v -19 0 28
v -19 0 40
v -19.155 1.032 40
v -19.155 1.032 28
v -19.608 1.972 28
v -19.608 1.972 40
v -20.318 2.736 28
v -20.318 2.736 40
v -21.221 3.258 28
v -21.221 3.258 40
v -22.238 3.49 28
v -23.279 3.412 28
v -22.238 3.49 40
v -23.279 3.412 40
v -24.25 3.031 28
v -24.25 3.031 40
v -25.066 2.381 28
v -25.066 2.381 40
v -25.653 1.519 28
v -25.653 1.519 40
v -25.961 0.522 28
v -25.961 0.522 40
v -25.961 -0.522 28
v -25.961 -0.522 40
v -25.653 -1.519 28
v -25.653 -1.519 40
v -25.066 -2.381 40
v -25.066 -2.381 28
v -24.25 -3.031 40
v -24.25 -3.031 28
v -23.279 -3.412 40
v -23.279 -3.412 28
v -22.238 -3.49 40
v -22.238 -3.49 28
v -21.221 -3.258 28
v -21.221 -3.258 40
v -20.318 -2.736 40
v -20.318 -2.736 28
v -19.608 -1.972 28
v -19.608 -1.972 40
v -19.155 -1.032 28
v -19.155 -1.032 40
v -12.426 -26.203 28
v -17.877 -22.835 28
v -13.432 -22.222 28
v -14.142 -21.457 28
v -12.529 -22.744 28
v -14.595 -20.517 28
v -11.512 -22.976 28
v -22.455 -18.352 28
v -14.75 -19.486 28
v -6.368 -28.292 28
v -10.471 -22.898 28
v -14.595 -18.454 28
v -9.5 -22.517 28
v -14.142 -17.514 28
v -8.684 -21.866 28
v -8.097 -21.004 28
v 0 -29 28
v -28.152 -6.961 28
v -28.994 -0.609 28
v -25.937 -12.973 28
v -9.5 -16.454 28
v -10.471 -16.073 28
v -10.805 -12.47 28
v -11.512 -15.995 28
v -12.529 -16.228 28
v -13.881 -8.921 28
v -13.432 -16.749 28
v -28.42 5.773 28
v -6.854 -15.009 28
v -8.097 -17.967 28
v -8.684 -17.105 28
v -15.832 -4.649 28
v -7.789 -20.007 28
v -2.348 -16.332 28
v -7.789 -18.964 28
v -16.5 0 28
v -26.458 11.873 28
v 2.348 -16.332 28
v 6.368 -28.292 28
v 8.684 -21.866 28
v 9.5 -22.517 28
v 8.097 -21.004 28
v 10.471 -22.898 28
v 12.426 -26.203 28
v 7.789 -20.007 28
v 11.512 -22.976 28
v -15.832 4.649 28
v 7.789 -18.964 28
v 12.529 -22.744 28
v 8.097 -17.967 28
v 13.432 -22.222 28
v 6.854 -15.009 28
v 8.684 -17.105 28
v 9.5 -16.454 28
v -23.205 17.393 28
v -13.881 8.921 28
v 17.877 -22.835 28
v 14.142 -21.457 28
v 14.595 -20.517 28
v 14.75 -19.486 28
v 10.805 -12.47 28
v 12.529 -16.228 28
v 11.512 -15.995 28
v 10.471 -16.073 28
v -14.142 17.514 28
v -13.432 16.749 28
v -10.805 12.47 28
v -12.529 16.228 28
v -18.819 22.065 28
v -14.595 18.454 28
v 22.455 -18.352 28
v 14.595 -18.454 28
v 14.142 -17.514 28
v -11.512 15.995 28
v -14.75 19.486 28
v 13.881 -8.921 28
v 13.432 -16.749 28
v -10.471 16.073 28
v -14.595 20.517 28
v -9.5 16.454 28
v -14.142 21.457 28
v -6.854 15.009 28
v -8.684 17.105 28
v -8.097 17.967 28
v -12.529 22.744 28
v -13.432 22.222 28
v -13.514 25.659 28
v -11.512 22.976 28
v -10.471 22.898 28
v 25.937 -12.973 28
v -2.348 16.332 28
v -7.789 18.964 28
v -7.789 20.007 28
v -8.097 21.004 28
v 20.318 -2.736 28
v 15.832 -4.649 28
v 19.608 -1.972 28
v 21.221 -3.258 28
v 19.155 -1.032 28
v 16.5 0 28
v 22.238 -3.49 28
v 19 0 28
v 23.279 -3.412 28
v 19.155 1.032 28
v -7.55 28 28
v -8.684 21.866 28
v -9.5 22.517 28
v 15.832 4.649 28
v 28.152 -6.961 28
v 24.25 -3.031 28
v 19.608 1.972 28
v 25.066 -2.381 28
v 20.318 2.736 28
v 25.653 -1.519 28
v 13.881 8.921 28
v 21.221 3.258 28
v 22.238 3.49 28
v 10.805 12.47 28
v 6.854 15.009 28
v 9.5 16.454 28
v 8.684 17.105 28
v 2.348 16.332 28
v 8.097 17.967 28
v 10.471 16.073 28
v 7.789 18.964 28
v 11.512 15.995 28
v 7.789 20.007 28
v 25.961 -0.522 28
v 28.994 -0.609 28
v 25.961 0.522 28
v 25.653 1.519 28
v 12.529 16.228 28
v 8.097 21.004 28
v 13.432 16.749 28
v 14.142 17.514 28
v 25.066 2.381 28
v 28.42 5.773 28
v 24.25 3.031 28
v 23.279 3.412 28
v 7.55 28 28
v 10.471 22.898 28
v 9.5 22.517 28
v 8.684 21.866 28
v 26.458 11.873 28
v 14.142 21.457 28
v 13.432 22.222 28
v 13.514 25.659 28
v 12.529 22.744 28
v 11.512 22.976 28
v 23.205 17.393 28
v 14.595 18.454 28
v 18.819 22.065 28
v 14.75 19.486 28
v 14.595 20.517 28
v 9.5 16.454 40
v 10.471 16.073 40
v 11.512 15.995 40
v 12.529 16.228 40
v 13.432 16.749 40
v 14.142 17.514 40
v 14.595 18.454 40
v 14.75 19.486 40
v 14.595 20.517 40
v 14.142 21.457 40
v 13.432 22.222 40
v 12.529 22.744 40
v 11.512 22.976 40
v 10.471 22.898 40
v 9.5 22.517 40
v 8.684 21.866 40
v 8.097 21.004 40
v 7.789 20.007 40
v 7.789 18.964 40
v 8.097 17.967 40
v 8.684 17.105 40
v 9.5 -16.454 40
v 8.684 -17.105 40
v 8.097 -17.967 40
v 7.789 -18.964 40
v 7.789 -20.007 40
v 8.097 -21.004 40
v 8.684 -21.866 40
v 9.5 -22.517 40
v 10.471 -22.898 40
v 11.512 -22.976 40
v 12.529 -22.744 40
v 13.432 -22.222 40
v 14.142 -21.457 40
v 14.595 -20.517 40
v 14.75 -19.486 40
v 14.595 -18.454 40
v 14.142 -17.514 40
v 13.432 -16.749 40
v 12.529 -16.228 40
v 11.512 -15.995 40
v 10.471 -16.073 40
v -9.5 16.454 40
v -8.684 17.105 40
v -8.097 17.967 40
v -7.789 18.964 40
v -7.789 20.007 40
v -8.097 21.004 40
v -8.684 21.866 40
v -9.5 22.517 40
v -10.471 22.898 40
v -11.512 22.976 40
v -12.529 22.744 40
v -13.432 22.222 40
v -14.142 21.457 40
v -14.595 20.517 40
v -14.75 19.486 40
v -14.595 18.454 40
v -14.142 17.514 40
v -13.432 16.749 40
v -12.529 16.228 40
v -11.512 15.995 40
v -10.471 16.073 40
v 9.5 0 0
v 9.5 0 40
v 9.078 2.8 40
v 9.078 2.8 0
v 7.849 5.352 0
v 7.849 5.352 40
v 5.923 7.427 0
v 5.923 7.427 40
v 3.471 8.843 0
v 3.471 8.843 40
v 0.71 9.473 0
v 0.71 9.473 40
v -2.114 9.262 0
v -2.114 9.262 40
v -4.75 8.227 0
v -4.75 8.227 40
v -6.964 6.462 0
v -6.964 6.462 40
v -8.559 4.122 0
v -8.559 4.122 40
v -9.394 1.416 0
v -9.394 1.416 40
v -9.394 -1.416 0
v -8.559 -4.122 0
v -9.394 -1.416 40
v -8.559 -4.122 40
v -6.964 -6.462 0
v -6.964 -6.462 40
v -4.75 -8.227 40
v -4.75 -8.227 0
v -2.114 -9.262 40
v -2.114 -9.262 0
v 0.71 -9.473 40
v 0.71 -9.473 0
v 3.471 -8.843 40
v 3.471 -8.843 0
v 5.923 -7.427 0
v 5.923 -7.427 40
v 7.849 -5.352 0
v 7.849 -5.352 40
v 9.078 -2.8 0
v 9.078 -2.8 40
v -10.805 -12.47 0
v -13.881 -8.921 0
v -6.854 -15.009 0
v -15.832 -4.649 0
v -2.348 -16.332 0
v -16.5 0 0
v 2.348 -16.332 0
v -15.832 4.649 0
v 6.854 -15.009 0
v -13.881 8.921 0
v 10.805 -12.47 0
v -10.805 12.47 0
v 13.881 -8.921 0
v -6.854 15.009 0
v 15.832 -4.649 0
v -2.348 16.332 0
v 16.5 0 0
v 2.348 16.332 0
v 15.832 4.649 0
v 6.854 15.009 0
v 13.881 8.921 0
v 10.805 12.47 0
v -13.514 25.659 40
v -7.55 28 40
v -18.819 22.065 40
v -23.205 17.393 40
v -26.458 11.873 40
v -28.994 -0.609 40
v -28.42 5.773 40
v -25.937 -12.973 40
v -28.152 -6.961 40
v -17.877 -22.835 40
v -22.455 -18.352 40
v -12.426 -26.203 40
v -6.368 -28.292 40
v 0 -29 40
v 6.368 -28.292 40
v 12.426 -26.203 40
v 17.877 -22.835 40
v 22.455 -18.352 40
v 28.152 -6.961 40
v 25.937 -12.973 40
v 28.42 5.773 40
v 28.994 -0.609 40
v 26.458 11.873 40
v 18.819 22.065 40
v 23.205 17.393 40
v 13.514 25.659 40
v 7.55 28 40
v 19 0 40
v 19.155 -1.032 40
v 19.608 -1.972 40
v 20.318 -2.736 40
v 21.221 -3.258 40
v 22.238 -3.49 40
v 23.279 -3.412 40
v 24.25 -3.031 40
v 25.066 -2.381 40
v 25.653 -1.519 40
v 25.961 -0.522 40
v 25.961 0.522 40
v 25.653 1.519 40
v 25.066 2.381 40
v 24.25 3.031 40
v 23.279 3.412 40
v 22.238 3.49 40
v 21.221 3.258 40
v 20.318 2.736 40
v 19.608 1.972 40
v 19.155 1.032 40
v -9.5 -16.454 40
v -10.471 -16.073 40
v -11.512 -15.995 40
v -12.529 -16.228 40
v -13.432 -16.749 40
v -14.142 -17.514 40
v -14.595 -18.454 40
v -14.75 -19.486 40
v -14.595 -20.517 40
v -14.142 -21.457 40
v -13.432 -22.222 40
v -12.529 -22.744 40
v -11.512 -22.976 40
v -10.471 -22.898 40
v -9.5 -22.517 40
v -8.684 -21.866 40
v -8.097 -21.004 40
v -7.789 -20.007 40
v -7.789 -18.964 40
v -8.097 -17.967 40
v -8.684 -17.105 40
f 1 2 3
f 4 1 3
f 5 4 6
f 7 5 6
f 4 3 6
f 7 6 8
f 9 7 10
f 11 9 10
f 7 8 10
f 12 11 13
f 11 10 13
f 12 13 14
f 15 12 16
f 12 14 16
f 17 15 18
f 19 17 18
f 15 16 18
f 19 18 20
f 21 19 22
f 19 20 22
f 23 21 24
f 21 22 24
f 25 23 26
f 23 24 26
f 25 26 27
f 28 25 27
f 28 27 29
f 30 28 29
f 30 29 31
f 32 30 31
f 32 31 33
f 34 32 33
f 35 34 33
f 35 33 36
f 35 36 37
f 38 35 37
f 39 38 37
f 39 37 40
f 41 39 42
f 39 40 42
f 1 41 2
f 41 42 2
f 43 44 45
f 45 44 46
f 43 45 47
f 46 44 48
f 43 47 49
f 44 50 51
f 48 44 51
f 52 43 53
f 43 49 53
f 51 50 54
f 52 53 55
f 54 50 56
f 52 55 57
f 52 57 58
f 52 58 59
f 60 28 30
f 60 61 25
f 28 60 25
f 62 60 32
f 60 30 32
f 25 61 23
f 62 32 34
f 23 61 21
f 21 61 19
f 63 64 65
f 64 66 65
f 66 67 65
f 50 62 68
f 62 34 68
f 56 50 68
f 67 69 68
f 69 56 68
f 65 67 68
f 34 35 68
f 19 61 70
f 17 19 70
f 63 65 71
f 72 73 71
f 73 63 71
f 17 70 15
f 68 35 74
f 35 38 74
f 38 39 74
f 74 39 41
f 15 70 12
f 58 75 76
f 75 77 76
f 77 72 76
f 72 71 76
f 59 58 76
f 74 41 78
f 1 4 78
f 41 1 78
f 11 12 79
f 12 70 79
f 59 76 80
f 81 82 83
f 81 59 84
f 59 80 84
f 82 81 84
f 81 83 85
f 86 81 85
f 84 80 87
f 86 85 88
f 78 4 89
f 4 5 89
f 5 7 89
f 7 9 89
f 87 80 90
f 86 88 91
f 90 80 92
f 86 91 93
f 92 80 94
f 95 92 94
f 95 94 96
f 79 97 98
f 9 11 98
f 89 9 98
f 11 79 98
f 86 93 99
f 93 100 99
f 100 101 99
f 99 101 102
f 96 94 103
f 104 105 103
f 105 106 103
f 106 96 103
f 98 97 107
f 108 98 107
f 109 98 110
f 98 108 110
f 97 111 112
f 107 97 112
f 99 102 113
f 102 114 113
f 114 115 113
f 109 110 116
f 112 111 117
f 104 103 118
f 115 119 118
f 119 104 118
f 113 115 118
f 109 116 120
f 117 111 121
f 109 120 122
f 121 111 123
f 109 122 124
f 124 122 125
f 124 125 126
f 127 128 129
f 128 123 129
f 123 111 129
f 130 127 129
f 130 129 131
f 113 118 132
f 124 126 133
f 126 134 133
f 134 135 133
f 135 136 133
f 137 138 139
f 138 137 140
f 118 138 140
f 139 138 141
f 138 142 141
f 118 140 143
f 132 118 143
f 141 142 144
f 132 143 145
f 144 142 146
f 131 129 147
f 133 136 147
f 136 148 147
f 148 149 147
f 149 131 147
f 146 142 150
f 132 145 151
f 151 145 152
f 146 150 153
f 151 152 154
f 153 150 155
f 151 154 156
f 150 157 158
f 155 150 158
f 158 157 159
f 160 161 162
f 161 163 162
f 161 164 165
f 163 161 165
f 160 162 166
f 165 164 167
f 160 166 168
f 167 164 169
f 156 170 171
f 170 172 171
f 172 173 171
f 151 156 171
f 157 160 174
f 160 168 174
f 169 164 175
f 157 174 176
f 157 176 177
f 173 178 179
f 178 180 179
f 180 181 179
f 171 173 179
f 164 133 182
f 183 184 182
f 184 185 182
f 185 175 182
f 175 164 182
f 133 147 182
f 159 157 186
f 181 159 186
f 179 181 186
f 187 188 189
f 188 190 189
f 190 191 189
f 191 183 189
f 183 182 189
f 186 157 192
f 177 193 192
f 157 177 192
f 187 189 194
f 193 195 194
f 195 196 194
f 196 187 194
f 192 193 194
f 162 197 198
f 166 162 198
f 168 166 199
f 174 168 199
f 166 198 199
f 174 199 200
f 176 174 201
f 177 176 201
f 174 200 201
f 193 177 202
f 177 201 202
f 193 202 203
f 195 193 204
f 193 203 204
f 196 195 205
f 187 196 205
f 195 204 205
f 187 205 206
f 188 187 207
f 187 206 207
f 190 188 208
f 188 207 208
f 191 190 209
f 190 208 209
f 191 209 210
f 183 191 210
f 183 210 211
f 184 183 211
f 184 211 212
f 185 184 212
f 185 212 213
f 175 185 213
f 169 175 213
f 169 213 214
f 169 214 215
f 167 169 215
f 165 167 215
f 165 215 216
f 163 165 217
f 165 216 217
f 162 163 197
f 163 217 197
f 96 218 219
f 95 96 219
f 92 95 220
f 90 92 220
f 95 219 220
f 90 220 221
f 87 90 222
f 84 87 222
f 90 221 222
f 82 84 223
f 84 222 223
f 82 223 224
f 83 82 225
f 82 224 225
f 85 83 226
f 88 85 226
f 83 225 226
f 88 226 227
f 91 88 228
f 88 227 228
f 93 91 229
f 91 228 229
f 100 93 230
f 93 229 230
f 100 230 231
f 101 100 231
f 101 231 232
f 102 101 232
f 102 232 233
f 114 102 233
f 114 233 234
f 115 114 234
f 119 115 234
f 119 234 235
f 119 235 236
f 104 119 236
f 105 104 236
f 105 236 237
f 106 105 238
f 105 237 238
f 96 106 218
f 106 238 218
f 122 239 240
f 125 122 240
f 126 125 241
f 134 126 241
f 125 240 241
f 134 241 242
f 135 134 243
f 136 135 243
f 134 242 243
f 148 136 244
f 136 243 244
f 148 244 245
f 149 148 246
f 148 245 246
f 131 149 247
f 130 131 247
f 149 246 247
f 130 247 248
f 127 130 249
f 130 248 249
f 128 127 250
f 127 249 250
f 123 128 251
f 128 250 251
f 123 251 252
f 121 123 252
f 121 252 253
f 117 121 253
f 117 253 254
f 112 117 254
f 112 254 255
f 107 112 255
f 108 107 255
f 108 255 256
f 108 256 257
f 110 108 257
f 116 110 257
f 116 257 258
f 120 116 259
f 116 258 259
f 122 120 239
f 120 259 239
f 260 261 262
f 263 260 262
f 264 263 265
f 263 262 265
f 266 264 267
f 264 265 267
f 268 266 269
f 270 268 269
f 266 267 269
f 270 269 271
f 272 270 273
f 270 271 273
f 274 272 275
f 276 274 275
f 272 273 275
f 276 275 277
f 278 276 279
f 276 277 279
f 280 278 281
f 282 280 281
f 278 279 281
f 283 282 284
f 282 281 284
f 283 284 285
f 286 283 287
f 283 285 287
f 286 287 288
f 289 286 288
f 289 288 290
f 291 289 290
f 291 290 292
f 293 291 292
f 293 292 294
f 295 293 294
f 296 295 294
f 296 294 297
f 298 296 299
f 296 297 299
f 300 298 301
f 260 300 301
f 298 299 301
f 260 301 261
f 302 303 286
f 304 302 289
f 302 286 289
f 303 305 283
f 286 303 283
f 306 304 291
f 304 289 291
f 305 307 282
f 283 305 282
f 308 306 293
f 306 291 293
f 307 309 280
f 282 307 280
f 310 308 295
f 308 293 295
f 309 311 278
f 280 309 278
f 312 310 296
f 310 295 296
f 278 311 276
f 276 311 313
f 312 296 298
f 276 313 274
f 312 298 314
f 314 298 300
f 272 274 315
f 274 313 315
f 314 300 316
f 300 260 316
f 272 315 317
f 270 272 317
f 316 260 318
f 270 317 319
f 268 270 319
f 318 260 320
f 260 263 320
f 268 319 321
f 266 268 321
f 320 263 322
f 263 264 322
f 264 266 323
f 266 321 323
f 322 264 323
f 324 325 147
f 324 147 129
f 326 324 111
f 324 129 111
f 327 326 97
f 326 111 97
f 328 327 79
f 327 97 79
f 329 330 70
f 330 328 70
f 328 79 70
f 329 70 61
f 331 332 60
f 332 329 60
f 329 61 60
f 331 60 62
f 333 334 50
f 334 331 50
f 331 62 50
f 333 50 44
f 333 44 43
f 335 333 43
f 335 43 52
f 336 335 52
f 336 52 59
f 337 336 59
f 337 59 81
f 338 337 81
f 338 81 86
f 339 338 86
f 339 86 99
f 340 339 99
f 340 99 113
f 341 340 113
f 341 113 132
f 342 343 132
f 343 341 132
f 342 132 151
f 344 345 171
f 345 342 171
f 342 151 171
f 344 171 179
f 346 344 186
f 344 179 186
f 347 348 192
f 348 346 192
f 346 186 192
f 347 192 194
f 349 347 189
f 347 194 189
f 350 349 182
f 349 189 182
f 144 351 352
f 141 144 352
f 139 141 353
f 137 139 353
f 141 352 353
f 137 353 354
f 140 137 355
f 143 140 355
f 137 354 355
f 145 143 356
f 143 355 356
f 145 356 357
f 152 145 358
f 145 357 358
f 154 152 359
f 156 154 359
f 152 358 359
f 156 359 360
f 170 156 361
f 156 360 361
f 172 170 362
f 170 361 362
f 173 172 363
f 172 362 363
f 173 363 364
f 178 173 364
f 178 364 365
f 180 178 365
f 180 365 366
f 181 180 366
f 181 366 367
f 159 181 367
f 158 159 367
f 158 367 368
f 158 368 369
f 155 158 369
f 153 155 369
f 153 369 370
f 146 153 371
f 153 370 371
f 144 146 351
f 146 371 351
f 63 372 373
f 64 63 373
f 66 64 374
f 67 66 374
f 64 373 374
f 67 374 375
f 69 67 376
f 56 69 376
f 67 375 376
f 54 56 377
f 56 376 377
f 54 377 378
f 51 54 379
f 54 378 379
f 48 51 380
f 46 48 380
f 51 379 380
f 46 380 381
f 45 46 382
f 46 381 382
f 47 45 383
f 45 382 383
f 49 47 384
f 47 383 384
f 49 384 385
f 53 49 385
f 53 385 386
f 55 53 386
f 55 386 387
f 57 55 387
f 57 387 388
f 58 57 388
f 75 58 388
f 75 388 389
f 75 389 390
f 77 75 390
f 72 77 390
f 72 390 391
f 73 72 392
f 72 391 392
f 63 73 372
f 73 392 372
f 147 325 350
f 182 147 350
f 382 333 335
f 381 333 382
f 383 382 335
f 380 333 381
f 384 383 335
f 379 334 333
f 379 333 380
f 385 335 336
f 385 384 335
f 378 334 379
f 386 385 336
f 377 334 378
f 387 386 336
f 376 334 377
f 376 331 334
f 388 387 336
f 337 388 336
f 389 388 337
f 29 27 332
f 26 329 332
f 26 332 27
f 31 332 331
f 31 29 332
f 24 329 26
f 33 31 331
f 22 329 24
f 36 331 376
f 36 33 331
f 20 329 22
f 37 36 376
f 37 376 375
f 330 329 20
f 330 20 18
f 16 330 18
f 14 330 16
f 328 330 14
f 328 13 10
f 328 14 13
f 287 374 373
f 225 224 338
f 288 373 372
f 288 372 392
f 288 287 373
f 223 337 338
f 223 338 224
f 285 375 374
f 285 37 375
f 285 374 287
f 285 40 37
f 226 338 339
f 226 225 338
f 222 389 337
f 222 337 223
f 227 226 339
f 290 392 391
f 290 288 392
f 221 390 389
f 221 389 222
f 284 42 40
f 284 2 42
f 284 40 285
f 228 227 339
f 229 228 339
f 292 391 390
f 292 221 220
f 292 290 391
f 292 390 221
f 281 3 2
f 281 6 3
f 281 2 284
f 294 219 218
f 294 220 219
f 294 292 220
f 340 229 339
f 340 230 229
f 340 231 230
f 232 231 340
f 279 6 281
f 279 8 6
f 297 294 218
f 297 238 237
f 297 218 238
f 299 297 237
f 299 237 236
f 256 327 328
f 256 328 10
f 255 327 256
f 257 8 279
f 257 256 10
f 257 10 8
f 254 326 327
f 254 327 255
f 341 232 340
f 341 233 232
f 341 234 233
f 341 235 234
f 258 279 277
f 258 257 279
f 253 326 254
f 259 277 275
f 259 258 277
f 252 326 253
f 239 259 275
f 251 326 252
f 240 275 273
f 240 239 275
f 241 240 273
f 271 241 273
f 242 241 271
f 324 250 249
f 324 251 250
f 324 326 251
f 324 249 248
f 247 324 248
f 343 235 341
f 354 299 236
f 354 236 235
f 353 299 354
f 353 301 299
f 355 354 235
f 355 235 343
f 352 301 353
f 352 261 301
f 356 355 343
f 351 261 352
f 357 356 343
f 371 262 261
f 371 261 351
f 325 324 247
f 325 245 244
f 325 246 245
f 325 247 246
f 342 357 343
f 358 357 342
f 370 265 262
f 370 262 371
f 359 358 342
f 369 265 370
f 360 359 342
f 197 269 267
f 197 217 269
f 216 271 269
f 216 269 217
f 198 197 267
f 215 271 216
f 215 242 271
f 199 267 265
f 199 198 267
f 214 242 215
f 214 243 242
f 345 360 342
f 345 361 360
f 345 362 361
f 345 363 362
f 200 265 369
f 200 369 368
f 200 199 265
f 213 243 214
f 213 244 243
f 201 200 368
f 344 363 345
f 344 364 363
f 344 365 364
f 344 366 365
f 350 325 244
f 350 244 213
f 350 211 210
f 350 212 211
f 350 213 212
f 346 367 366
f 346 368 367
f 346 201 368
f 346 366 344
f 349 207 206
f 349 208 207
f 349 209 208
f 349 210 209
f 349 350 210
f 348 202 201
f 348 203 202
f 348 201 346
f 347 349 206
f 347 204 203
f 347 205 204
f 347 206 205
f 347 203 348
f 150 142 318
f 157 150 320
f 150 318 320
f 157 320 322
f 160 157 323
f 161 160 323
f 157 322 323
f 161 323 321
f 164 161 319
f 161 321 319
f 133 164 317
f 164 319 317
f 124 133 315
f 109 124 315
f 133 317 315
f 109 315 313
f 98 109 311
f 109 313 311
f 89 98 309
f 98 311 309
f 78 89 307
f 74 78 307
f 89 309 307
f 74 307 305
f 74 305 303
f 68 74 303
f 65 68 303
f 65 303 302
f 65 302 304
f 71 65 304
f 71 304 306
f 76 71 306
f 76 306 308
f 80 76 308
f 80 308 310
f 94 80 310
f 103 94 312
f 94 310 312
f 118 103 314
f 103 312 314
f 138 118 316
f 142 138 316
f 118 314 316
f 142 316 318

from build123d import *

# Parameters (mm, degrees)
SZKIC1_R                    = 16.5
DODANIE_WYCI_GNI_CIE1_DEPTH = 28
SZKIC2_R                    = 29
DODANIE_WYCI_GNI_CIE2_DEPTH = 12
SZKIC3_R                    = 9.5
WYTNIJ_WYCI_GNI_CIE1_DEPTH  = 40
SZKIC4_W                    = 33.487046283
SZKIC4_H                    = 1
WYTNIJ_WYCI_GNI_CIE2_DEPTH  = 12
SZKIC5_R                    = 3.5
WYTNIJ_WYCI_GNI_CIE3_DEPTH  = 12
SZYK_KO_OWY1_COUNT          = 6


with BuildPart() as part:
    # Szkic1 → Dodanie-wyciągnięcie1 (new body)
    with BuildSketch(Plane.XY):
        Circle(SZKIC1_R)
    extrude(amount=DODANIE_WYCI_GNI_CIE1_DEPTH)

    # Szkic2 → Dodanie-wyciągnięcie2 (add)
    with BuildSketch(Plane.XY.offset(28)):
        Circle(SZKIC2_R)
    extrude(amount=DODANIE_WYCI_GNI_CIE2_DEPTH)

    # Szkic3 → Wytnij-wyciągnięcie1 (cut)
    with BuildSketch(Plane.XY.offset(40)):
        Circle(SZKIC3_R)
    extrude(amount=-WYTNIJ_WYCI_GNI_CIE1_DEPTH, mode=Mode.SUBTRACT)

    # Szkic4 → Wytnij-wyciągnięcie2 (cut)
    with BuildSketch(Plane.XY.offset(40)):
        with Locations((-0.738693263, 28.5)):
            Rectangle(SZKIC4_W, SZKIC4_H)
    extrude(amount=-WYTNIJ_WYCI_GNI_CIE2_DEPTH, mode=Mode.SUBTRACT)

    # Szkic5 → Wytnij-wyciągnięcie3 (cut)
    with BuildSketch(Plane.XY.offset(40)):
        with Locations((-22.5, 0)):
            Circle(SZKIC5_R)
    wytnij_wyci_gni_cie3 = extrude(amount=-WYTNIJ_WYCI_GNI_CIE3_DEPTH, mode=Mode.SUBTRACT)

    # Szyk kołowy1: Wytnij-wyciągnięcie3 ×6 about axis
    szyk_ko_owy1_axis = Axis((0, 0, 0), (0, 0, 1))
    for i in range(1, SZYK_KO_OWY1_COUNT):
        add(wytnij_wyci_gni_cie3.rotate(szyk_ko_owy1_axis, i * 360 / SZYK_KO_OWY1_COUNT), mode=Mode.SUBTRACT)


solid = part.part
